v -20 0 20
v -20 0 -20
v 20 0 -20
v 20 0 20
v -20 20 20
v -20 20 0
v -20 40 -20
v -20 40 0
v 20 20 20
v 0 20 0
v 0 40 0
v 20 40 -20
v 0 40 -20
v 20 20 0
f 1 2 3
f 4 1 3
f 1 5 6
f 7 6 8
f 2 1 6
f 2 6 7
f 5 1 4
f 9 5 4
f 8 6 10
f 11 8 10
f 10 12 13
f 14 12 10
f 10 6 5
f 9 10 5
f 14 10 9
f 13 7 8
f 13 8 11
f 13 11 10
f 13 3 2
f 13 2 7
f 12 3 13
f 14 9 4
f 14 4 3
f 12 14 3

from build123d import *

# Parameters (mm, degrees)
CROQUIS1_W              = 40
CROQUIS1_H              = 40
SALIENTE_EXTRUIR1_DEPTH = 20
CROQUIS2_W              = 20
CROQUIS2_H              = 20
SALIENTE_EXTRUIR2_DEPTH = 20
SALIENTE_EXTRUIR3_DEPTH = 20


with BuildPart() as part:
    # Croquis1 → Saliente-Extruir1 (new body)
    with BuildSketch(Plane(origin=(0, 0, 0), x_dir=(1, 0, 0), z_dir=(0, 1, 0))):
        Rectangle(CROQUIS1_W, CROQUIS1_H)
    extrude(amount=SALIENTE_EXTRUIR1_DEPTH)

    # Croquis2 → Saliente-Extruir2 (add)
    with BuildSketch(Plane(origin=(0, 20, 0), x_dir=(1, 0, 0), z_dir=(0, 1, 0))):
        with Locations((-10, 10)):
            Rectangle(CROQUIS2_W, CROQUIS2_H)
    extrude(amount=SALIENTE_EXTRUIR2_DEPTH)

    # Croquis3 → Saliente-Extruir3 (add)
    with BuildSketch(Plane(origin=(20, 0, 0), x_dir=(0, 0, -1), z_dir=(1, 0, 0))):
        Polygon((20, 20), (20, 40), (0, 20), align=None)
    extrude(amount=-SALIENTE_EXTRUIR3_DEPTH)


solid = part.part
